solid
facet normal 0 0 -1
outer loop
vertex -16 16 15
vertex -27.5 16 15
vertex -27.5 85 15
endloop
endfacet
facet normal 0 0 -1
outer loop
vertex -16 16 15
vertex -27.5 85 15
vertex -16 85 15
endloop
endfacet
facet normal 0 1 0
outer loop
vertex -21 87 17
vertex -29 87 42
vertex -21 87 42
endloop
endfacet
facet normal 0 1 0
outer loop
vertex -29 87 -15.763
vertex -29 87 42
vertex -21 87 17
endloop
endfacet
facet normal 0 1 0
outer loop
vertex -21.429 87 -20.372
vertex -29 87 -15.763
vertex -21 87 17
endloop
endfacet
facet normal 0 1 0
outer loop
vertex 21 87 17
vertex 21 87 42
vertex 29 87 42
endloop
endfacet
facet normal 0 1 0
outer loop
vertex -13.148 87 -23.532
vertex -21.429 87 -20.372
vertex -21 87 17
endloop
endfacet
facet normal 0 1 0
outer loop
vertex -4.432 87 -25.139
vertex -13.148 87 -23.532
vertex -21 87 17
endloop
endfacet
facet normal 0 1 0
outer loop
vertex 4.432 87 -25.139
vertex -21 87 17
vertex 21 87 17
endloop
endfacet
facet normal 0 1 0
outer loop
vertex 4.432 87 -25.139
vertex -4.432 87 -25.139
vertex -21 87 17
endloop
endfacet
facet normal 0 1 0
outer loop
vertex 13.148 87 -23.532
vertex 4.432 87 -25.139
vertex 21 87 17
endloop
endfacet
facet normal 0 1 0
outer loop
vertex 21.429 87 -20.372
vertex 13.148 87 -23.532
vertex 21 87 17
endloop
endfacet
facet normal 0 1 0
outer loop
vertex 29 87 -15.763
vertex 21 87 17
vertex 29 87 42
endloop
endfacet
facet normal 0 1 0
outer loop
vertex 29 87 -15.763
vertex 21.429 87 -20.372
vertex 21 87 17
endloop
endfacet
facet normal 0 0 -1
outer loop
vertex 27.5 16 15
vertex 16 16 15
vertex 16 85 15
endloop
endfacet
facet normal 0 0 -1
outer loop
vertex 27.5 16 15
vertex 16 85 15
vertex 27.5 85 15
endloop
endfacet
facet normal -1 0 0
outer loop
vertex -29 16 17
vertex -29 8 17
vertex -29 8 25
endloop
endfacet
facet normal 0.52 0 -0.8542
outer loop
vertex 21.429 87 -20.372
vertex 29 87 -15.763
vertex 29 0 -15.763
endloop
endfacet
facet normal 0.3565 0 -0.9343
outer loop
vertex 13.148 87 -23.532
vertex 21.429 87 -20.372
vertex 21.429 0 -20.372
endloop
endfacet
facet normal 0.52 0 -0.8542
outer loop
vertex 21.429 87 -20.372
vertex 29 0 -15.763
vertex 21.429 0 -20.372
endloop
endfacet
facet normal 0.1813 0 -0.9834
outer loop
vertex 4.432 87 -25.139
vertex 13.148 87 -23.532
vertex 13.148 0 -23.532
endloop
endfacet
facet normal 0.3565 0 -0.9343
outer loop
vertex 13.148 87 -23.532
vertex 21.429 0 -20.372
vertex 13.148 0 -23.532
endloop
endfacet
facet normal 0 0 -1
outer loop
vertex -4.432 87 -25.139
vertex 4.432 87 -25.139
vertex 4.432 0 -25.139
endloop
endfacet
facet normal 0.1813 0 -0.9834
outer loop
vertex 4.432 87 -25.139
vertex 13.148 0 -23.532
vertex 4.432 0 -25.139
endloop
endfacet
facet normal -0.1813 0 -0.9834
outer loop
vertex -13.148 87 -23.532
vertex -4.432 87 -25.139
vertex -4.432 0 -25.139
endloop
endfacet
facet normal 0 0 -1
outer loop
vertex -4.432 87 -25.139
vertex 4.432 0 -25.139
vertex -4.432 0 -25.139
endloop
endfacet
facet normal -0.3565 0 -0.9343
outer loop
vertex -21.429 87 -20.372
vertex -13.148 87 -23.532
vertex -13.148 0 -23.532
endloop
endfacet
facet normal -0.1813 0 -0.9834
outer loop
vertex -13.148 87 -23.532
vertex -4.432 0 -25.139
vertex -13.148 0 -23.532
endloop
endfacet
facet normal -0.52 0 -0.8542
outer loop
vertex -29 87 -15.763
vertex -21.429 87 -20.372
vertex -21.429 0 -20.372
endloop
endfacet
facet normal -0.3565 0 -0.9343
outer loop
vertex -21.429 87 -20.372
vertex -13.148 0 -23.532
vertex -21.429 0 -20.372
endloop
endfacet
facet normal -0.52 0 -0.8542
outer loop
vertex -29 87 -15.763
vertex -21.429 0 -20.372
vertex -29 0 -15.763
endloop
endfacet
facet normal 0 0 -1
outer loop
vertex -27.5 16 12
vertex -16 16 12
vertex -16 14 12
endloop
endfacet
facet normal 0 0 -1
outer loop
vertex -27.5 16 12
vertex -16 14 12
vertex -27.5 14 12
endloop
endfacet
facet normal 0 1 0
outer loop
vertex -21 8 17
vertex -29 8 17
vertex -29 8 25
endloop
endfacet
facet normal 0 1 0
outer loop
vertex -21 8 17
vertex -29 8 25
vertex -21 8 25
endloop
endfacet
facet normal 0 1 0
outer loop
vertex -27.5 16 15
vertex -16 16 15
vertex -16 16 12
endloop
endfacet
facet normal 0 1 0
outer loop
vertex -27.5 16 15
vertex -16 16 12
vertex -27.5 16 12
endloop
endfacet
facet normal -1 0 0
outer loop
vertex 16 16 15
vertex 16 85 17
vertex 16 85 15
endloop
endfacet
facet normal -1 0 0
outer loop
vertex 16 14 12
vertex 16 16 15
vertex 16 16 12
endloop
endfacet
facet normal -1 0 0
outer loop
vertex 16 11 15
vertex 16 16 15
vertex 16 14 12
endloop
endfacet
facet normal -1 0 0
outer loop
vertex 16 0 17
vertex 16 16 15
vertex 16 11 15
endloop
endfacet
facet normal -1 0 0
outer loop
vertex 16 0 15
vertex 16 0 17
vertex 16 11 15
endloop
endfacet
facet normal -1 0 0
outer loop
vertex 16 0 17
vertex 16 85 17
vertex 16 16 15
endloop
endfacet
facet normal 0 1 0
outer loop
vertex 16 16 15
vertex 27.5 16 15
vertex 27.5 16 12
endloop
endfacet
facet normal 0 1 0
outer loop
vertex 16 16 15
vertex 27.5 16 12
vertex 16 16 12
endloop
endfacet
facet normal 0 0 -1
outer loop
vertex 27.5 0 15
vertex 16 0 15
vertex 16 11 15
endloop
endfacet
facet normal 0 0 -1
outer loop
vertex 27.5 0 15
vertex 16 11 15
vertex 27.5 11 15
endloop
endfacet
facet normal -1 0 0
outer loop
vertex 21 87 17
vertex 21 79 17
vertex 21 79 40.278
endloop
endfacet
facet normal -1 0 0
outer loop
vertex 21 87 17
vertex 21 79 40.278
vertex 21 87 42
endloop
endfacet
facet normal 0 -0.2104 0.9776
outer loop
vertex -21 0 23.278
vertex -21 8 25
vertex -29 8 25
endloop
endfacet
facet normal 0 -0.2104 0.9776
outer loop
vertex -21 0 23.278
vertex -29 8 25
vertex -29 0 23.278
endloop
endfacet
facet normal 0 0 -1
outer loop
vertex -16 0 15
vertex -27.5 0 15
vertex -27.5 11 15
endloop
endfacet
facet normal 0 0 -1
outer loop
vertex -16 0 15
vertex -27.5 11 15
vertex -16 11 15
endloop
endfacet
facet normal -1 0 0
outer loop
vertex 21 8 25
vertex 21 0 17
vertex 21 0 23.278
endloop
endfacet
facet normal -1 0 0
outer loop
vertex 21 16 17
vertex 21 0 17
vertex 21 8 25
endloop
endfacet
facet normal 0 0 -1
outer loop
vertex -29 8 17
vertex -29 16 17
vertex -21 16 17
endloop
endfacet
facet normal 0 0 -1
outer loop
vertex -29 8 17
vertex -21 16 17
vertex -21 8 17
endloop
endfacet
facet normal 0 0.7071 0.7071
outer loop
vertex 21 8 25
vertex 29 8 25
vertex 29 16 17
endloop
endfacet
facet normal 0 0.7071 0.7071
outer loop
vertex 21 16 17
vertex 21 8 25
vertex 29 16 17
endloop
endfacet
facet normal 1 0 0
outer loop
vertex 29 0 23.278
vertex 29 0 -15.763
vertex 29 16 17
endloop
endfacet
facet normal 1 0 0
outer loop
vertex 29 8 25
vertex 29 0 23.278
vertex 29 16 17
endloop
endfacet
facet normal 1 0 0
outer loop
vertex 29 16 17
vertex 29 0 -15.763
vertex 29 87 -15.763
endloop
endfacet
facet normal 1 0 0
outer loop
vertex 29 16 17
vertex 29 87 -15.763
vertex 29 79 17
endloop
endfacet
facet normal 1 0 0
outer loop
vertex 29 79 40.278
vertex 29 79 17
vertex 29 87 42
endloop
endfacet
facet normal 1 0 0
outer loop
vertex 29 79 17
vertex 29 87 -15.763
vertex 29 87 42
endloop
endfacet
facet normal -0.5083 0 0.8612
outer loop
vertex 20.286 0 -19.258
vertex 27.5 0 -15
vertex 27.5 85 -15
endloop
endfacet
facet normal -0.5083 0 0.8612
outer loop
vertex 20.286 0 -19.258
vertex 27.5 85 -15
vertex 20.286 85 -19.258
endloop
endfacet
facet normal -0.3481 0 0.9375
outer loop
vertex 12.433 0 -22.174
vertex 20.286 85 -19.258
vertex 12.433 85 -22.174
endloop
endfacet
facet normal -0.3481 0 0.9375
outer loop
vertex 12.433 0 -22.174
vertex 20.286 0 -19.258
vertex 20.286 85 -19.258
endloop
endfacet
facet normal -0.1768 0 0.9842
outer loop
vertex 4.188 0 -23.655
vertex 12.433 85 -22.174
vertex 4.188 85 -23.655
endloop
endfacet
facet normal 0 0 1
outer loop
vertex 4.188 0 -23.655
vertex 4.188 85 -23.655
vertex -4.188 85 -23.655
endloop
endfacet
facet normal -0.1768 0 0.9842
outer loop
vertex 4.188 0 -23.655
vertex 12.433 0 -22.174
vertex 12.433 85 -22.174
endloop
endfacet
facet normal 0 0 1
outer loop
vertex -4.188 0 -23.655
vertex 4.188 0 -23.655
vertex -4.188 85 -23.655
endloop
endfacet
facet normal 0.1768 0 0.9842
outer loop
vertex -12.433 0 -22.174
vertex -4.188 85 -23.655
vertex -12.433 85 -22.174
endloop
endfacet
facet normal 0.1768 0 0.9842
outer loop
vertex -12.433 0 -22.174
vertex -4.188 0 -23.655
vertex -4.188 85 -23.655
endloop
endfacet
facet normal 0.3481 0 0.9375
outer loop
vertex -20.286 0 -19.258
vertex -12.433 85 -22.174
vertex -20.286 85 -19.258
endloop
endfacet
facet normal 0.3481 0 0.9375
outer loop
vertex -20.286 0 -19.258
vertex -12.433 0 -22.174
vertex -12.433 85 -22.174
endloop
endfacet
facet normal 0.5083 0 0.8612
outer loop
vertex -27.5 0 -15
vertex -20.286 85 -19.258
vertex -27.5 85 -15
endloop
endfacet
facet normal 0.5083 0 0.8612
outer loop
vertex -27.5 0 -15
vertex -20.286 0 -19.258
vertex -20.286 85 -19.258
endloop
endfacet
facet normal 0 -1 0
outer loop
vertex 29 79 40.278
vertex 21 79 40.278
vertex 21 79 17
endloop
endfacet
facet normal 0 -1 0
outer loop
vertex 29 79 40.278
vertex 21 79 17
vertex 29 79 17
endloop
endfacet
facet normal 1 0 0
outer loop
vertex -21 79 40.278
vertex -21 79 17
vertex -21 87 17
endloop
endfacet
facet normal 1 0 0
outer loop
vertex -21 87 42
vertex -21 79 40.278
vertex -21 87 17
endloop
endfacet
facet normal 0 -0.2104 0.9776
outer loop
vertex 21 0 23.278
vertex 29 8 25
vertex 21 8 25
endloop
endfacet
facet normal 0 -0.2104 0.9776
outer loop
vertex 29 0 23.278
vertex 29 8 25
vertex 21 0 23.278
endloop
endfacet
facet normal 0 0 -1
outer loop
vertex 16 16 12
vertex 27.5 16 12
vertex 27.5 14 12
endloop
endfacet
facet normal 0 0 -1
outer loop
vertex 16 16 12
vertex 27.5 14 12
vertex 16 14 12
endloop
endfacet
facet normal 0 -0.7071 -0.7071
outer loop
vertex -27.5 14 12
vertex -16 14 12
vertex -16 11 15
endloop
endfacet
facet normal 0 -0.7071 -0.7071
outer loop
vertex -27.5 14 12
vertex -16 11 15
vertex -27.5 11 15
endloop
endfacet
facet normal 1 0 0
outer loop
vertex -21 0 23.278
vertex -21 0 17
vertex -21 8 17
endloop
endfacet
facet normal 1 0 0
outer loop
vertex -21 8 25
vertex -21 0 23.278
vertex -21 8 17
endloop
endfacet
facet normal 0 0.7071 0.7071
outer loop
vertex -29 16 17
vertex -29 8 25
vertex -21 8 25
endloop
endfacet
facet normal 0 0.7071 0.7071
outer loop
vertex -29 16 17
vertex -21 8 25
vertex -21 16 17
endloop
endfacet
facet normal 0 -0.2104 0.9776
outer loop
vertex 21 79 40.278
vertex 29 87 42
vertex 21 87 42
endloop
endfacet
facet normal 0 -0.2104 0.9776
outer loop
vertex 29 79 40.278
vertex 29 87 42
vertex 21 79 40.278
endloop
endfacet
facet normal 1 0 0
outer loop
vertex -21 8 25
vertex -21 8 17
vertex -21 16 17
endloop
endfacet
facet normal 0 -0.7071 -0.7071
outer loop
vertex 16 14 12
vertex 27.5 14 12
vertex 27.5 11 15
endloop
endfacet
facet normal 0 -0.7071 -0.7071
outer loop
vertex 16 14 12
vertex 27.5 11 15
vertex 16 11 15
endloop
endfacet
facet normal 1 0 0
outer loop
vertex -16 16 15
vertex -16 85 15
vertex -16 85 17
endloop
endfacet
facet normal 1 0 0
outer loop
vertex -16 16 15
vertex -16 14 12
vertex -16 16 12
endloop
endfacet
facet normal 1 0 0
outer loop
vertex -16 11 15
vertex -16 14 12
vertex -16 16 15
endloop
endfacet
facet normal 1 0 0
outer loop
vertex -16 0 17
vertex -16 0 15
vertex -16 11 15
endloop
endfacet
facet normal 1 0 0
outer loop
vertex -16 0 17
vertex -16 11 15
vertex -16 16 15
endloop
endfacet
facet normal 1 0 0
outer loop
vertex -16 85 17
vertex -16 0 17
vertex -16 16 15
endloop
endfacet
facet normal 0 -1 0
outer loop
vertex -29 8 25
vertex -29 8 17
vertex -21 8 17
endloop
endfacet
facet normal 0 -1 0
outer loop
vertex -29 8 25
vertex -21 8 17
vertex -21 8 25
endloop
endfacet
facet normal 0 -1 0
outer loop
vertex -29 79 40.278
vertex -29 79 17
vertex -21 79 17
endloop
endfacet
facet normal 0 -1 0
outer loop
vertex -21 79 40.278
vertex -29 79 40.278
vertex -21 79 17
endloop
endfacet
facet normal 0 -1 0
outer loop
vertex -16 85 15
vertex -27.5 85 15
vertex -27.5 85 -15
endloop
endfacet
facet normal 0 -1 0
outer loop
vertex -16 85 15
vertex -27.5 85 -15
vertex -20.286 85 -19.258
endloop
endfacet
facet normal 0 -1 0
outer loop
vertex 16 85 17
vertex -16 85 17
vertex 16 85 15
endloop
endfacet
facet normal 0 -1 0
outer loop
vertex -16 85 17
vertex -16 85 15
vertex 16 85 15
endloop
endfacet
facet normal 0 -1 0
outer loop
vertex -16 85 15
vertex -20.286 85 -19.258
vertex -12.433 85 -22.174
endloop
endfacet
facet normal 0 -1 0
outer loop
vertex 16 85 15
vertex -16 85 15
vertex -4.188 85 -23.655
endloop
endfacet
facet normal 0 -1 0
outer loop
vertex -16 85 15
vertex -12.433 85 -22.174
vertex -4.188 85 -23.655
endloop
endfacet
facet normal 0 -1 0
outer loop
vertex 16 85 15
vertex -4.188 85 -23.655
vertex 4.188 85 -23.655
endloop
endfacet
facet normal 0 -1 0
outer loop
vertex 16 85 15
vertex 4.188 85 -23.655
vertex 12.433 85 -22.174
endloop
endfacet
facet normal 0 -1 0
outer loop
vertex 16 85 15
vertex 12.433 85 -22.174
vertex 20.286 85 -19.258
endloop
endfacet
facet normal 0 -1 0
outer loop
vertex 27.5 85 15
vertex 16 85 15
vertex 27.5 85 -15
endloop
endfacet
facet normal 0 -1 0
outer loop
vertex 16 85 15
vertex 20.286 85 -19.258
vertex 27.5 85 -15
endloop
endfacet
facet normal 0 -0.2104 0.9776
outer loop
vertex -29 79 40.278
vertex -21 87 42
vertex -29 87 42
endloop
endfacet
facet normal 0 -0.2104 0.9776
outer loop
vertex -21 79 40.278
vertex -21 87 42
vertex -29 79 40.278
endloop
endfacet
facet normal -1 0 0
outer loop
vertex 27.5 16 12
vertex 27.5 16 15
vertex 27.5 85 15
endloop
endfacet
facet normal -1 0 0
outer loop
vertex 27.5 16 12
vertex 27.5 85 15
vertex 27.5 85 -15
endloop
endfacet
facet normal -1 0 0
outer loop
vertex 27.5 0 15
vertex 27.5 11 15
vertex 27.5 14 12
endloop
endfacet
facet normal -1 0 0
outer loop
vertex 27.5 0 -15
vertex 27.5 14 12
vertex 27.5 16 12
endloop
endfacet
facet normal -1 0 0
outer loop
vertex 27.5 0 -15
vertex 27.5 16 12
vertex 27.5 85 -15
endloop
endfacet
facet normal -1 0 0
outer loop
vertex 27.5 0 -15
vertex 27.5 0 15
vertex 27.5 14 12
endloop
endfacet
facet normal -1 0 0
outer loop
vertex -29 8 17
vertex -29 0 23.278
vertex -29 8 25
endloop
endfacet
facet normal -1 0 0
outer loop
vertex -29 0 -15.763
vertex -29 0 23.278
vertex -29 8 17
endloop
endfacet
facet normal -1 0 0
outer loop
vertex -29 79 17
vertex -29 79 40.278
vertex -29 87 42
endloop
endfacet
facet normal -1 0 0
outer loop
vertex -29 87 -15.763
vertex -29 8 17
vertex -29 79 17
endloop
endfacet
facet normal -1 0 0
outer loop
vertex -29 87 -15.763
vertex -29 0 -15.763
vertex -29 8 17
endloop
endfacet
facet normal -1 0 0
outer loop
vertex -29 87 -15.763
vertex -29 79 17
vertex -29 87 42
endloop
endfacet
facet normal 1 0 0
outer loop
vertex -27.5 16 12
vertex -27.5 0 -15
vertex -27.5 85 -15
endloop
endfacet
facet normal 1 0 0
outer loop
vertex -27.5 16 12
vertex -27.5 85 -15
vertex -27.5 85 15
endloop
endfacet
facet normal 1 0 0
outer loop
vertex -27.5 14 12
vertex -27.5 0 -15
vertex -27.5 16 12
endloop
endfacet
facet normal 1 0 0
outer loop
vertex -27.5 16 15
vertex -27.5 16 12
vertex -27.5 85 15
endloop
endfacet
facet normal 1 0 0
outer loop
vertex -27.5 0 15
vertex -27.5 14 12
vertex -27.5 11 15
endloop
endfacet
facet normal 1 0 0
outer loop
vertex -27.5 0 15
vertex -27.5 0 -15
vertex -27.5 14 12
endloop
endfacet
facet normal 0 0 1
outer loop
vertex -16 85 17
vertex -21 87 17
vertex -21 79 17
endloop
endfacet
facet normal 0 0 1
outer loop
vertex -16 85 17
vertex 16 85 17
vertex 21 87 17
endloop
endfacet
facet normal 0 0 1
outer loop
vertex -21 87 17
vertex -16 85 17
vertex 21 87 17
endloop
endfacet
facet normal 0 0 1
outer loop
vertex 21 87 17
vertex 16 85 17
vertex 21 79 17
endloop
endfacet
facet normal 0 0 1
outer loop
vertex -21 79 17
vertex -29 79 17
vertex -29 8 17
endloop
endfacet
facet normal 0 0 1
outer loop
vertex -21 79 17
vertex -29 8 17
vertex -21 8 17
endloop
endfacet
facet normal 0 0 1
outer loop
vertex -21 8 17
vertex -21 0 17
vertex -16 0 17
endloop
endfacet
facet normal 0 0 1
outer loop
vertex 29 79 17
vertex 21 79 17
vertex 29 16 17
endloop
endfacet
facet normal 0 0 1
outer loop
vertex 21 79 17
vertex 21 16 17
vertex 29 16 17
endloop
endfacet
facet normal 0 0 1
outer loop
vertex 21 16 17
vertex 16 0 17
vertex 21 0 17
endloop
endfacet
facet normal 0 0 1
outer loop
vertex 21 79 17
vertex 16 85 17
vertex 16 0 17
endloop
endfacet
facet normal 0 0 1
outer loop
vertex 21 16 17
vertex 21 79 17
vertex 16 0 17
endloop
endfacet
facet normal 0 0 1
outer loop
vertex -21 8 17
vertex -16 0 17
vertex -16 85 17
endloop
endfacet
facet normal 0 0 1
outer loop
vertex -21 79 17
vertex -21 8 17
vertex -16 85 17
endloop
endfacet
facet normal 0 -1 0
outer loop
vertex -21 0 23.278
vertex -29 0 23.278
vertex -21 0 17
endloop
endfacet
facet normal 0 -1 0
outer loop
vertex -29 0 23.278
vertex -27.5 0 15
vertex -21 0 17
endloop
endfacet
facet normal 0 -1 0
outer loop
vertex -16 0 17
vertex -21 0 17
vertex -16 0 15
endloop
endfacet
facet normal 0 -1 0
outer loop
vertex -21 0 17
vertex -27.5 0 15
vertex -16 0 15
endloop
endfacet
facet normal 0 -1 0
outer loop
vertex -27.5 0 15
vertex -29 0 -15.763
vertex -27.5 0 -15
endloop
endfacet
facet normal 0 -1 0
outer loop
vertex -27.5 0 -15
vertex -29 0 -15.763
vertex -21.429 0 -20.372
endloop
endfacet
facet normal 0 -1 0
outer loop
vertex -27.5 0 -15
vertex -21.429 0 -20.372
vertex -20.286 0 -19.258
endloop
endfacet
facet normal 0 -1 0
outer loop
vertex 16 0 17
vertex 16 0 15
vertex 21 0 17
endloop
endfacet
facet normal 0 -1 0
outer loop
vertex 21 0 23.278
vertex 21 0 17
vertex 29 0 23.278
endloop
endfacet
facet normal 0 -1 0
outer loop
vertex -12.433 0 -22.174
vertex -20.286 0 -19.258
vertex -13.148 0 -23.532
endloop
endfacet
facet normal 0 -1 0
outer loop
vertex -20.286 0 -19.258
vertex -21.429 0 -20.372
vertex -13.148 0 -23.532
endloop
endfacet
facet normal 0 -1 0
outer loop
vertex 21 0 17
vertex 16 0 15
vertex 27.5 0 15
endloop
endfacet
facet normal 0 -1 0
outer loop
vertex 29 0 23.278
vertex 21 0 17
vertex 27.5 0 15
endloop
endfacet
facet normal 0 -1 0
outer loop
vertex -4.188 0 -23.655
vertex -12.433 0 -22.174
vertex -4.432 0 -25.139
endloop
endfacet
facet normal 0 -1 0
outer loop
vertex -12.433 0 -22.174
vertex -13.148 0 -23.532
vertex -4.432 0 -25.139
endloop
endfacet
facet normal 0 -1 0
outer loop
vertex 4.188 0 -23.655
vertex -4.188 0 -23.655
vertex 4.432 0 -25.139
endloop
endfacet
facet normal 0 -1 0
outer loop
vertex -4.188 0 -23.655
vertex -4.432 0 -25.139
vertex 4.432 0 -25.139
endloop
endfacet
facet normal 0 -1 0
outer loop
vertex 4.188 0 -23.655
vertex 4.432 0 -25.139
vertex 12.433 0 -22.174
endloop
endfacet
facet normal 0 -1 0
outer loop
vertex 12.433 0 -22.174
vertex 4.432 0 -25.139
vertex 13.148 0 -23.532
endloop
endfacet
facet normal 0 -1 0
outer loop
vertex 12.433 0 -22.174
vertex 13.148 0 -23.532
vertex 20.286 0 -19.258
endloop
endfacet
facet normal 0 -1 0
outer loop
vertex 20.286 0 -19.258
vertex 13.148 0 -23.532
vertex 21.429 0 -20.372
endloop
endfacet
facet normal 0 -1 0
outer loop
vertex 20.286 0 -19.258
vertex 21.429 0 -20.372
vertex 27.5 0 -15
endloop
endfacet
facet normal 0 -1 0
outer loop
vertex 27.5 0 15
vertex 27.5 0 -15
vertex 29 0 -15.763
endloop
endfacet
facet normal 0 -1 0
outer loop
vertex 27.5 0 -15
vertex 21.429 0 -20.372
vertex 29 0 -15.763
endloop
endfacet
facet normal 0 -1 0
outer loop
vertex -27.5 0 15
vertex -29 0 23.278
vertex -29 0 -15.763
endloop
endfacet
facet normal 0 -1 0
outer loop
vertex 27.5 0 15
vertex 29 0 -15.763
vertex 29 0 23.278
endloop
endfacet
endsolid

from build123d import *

# Parameters (mm, degrees)
BOSS_EXTRUDE1_DEPTH = 85
BOSS_EXTRUDE3_DEPTH = 2
SKETCH4_W           = 8
SKETCH4_H           = 8
BOSS_EXTRUDE4_DEPTH = 25
SKETCH5_W           = 8
SKETCH5_H           = 8
BOSS_EXTRUDE5_DEPTH = 8
CUT_EXTRUDE1_DEPTH  = 113.680965562
BOSS_EXTRUDE6_DEPTH = 8
BOSS_EXTRUDE7_DEPTH = 8
SKETCH9_W           = 11.5
SKETCH9_H           = 2
BOSS_EXTRUDE8_DEPTH = 3
CHAMFER1_SIZE       = 3


with BuildPart() as part:
    # Sketch1 → Boss-Extrude1 (new body)
    with BuildSketch(Plane(origin=(0, 0, 0), x_dir=(1, 0, 0), z_dir=(0, 1, 0))):
        with BuildLine():
            Line((-29, -15), (-29, 15.762564303))
            ThreePointArc((-29, 15.762564303), (0, 25.341269657), (29, 15.762564303))
            Line((29, 15.762564303), (29, -15))
            Line((29, -15), (29, -17))
            Line((29, -17), (27.5, -17))
            Line((27.5, -17), (16, -17))
            Line((16, -17), (16, -15))
            Line((16, -15), (27.5, -15))
            Line((27.5, -15), (27.5, 15))
            ThreePointArc((27.5, 15), (0, 23.841269657), (-27.5, 15))
            Line((-27.5, 15), (-27.5, -15))
            Line((-27.5, -15), (-16, -15))
            Line((-16, -15), (-16, -17))
            Line((-16, -17), (-27.5, -17))
            Line((-27.5, -17), (-29, -17))
            Line((-29, -17), (-29, -15))
        make_face()
    extrude(amount=BOSS_EXTRUDE1_DEPTH)

    # Sketch3 → Boss-Extrude3 (add)
    with BuildSketch(Plane(origin=(0, 85, 0), x_dir=(1, 0, 0), z_dir=(0, 1, 0))):
        with BuildLine():
            Line((-16, -17), (16, -17))
            Line((16, -17), (29, -17))
            Line((29, -17), (29, 15.762564303))
            ThreePointArc((29, 15.762564303), (0, 25.341269657), (-29, 15.762564303))
            Line((-29, 15.762564303), (-29, -17))
            Line((-29, -17), (-16, -17))
        make_face()
    extrude(amount=BOSS_EXTRUDE3_DEPTH)

    # Sketch4 → Boss-Extrude4 (add)
    with BuildSketch(Plane.XY.offset(17)):
        with Locations((-25, 83)):
            Rectangle(SKETCH4_W, SKETCH4_H)
        with Locations((25, 83)):
            Rectangle(SKETCH4_W, SKETCH4_H)
    extrude(amount=BOSS_EXTRUDE4_DEPTH)

    # Sketch5 → Boss-Extrude5 (add)
    with BuildSketch(Plane.XY.offset(17)):
        with Locations((-25, 4)):
            Rectangle(SKETCH5_W, SKETCH5_H)
        with Locations((25, 4)):
            Rectangle(SKETCH5_W, SKETCH5_H)
    extrude(amount=BOSS_EXTRUDE5_DEPTH)

    # Sketch6 → Cut-Extrude1 (cut, through all)
    with BuildSketch(Plane(origin=(29, 0, 0), x_dir=(0, 0, -1), z_dir=(1, 0, 0))):
        Polygon((-42, 87), (-25, 8), (-22.532486397, -3.466680862), (-79.892152399, -33.861041242), (-91.286550285, 63.092144643), (-70.491971044, 113.237202283), (-29.556352235, 113.237202283), align=None)
    extrude(amount=-CUT_EXTRUDE1_DEPTH, mode=Mode.SUBTRACT)

    # Sketch7 → Boss-Extrude6 (add)
    with BuildSketch(Plane(origin=(29, 0, 0), x_dir=(0, 0, -1), z_dir=(1, 0, 0))):
        Polygon((-25, 8), (-17, 16), (-17, 8), align=None)
    extrude(amount=-BOSS_EXTRUDE6_DEPTH)

    # Sketch9 → Boss-Extrude8 (add)
    with BuildSketch(Plane(origin=(0, 0, 15), x_dir=(-1, 0, 0), z_dir=(0, 0, -1))):
        with Locations((-21.75, 15)):
            Rectangle(SKETCH9_W, SKETCH9_H)
        with Locations((21.75, 15)):
            Rectangle(SKETCH9_W, SKETCH9_H)
    extrude(amount=BOSS_EXTRUDE8_DEPTH)

    # Chamfer1
    chamfer1_edges = [part.edges().sort_by_distance(p)[0] for p in [
        (-21.75, 14, 15),
        (21.75, 14, 15),
    ]]
    chamfer(chamfer1_edges, length=CHAMFER1_SIZE - 0.0001)  # a hair under: the kernel refuses the full size


with BuildPart() as body_2:
    # Sketch8 → Boss-Extrude7 (new body)
    with BuildSketch(Plane.ZY.offset(29)):
        Polygon((25, 8), (17, 16), (17, 8), align=None)
    extrude(amount=-BOSS_EXTRUDE7_DEPTH)


solid = Compound([part.part, body_2.part])
